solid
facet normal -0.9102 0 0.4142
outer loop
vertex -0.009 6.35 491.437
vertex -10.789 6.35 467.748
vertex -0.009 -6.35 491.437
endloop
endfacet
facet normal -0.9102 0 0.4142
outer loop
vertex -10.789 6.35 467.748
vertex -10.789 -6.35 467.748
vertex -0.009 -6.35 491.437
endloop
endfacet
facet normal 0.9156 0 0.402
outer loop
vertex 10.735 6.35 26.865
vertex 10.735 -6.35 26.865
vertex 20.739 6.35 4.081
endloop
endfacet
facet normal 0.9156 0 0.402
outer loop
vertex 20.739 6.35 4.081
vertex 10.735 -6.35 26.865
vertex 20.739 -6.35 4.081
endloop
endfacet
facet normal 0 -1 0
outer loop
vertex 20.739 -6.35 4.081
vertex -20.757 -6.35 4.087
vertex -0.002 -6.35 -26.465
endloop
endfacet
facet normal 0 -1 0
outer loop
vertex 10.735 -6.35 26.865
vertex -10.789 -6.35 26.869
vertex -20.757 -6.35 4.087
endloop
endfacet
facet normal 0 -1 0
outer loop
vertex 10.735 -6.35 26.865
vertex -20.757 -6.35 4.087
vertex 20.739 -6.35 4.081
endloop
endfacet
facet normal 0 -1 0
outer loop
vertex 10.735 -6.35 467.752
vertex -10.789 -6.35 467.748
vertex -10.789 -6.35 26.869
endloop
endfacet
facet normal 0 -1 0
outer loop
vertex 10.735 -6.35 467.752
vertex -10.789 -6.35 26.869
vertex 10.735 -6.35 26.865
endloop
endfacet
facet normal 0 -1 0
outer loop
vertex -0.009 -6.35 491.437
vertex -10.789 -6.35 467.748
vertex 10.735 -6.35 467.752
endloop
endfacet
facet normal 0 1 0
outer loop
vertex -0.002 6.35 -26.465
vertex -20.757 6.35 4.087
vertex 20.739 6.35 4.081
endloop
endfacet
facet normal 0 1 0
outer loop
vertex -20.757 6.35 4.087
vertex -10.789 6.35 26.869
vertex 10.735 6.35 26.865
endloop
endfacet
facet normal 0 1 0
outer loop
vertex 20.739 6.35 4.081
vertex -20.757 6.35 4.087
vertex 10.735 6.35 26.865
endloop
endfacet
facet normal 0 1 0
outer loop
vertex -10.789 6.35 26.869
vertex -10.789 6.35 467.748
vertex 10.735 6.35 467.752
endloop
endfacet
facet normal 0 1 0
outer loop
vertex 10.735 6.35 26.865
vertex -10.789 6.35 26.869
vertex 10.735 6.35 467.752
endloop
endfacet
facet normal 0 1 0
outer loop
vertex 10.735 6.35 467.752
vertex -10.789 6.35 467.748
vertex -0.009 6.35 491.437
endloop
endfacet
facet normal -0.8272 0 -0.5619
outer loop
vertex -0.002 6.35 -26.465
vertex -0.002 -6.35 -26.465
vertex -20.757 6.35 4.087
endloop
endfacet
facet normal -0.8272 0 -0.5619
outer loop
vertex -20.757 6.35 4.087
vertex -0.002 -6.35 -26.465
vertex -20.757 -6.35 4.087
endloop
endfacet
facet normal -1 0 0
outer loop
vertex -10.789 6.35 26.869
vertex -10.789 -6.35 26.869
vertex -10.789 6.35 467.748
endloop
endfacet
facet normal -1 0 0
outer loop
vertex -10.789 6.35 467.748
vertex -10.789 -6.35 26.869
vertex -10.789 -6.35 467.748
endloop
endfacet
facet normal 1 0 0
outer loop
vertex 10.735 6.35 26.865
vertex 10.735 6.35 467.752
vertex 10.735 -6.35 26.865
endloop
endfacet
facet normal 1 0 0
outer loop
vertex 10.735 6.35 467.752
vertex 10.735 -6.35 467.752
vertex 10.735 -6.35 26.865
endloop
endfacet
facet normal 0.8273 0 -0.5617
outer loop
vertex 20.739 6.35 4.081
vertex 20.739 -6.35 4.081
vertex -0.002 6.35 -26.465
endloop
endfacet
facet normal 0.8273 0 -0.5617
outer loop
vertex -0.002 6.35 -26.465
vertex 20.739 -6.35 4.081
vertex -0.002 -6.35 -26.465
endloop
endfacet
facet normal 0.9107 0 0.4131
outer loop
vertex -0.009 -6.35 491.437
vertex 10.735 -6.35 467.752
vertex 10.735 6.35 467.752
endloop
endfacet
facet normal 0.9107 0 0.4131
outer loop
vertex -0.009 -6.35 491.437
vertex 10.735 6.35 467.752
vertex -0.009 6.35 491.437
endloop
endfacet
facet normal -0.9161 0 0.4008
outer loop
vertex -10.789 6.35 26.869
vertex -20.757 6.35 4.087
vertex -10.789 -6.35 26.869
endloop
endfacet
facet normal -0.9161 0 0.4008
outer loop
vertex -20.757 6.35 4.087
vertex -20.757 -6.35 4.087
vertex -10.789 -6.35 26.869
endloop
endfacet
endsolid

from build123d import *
from build123d import SkipClean  # not in build123d's __all__

# Parameters (mm, degrees)
F1_DEPTH = 6.35
F2_DEPTH = 6.35
F3_SIZE2 = 6.34999
F3_SIZE  = 6.34999
F4_DEPTH = 0.0254
F5_DEPTH = 0.0254
F7_DEPTH = 25.4
F8_DEPTH = 0.0254
F9_DEPTH = 0.0254


# Not quite as in the source:
# - a fillet or chamfer is up to 0.001 mm smaller than in the source, because OpenCascade refuses the exact size
# - ends of sketch curves that miss each other by under 0.0002 mm in the source are joined


with BuildPart() as f1:
    # F0 (on Front) → F1 (new body)
    with BuildSketch(Plane.XZ):
        Polygon((-17.139416188, 28.1973872334), (-27.9807504267, 3.4191238228), (0, -37.7674587071), (27.964355424, 3.4191238228), (17.08493568, 28.1973872334), (17.08493568, 469.1244959831), (0, 506.7884922028), (-17.139416188, 469.1244959831), align=None)
    extrude(amount=F1_DEPTH)

    # F2 (add): a face of the model
    f2_faces = [f1.faces().sort_by_distance(p)[0] for p in [
        (-0.0248835797, 0, 225.9211420486),
    ]]
    extrude(f2_faces, amount=F2_DEPTH)

    # F3 (size 6.35 and 6.35 in the source; OpenCascade refuses exactly that, so slightly less here)
    f3_edges = [f1.edges().sort_by_distance(p)[0] for p in [
        (-22.560083, -6.35, 15.808256),
        (-13.990375, -6.35, -17.174167),
        (13.982178, -6.35, -17.174167),
        (22.524646, -6.35, 15.808256),
        (17.084936, -6.35, 248.660942),
        (8.542468, -6.35, 487.956494),
        (-8.569708, -6.35, 487.956494),
        (-17.139416, -6.35, 248.660942),
        (-22.560083, 6.35, 15.808256),
        (-13.990375, 6.35, -17.174167),
        (13.982178, 6.35, -17.174167),
        (22.524646, 6.35, 15.808256),
        (17.084936, 6.35, 248.660942),
        (8.542468, 6.35, 487.956494),
        (-8.569708, 6.35, 487.956494),
        (-17.139416, 6.35, 248.660942),
    ]]
    chamfer(f3_edges, length=F3_SIZE, length2=F3_SIZE2)

    # F4 (add): a face of the model
    f4_faces = [f1.faces().sort_by_distance(p)[0] for p in [
        (-0.0252861091, -6.35, 223.0026633937),
    ]]
    extrude(f4_faces, amount=F4_DEPTH)

    # F5 (add): a face of the model
    f5_faces = [f1.faces().sort_by_distance(p)[0] for p in [
        (-0.0252861091, 6.35, 223.0026633937),
    ]]
    extrude(f5_faces, amount=F5_DEPTH)

    # F6 (on face) → F7 (cut)
    with BuildSketch(Plane.XZ.offset(6.3754)):
        Polygon((10.73493568, 467.7515936734), (10.73493568, 99.0661755204), (32.7086560428, 99.0661755204), (32.7086560428, 505.495429039), (10.73493568, 505.495429039), (10.73493568, 501.6054906496), (19.4450523704, 491.0283088684), (13.1097852611, 474.0980863571), (20.738528953, 474.0980863571), (20.738528953, 467.7515928086), align=None)
        Polygon((32.7086560428, 99.0661755204), (10.73493568, 99.0661755204), (10.73493568, 29.554810375), (20.738528953, 31.6301956773), (21.6034320424, 29.554810375), (32.7086560428, 29.554810375), align=None)
        Polygon((20.738528953, 31.6301956773), (10.73493568, 29.554810375), (21.6034320424, 29.554810375), align=None)
        Polygon((21.6034320424, 29.554810375), (10.73493568, 29.554810375), (10.73493568, 26.8647358603), (20.738530435, 4.0811948515), (27.3526439581, -1.5923568075), (32.2193913162, 4.0811982268), align=None)
        Polygon((-0.0092029974, 491.4372314137), (10.73494568, 467.7515949707), (10.73493568, 474.0980863571), (10.73493568, 501.6054906496), (0, 514.6415233612), (-11.796230803, 486.6769015789), (-10.789416188, 486.6769015789), (-10.789416188, 467.7476089999), align=None)
        Polygon((13.1097852611, 474.0980863571), (10.73493568, 467.7515928086), (20.738528953, 467.7515928086), (20.738528953, 474.0980863571), align=None)
        Polygon((10.73493568, 474.0980863571), (10.73493568, 467.7515936734), (13.1097852611, 474.0980863571), align=None)
        Polygon((10.73493568, 501.6054906496), (10.73493568, 474.0980863571), (13.1097852611, 474.0980863571), (19.4450523704, 491.0283088684), align=None)
        Polygon((27.3526439581, -1.5923568075), (20.738528953, 4.0811982268), (24.6255261009, -4.7715753101), align=None)
        Polygon((24.6255261009, -4.7715753101), (20.738530435, 4.0811948515), (-0.0015394217, -26.4652965043), (0, -41.624262929), (29.7397422671, -3.639997893), (27.3526439581, -1.5923568075), align=None)
        Polygon((-16.2565966219, 476.1029779911), (-10.789416188, 467.7476075543), (-10.789416188, 486.6769015789), (-11.796230803, 486.6769015789), align=None)
        Polygon((-10.789416188, 26.8690092904), (-10.789416188, 467.7476089999), (-16.2565966219, 476.1029779911), (-11.796230803, 486.6769015789), (-21.7237770557, 486.6769015789), (-21.7237770557, 26.8690092904), (-20.8278130876, 26.8690092904), (-18.3457657695, 33.1129990518), align=None)
        Polygon((0, -41.624262929), (-0.0015394241, -26.4652787056), (-20.7574730934, 4.0866529625), (-30.316057774, 2.9998017031), align=None)
        Polygon((-20.8278130876, 26.8690092904), (-10.789416188, 26.8690092904), (-18.3457657695, 33.1129990518), align=None)
        Polygon((-20.7574730934, 4.0866529625), (-10.789416188, 26.8690092904), (-20.8278130876, 26.8690092904), (-30.316057774, 2.9998017031), align=None)
    with SkipClean():  # cleaning this boolean's faces spoils the solid; the shape is the same uncleaned
        extrude(amount=-F7_DEPTH, mode=Mode.SUBTRACT)

    # F8 (cut): a face of the model
    f8_faces = [f1.faces().sort_by_distance(p)[0] for p in [
        (-0.0252861091, -6.3754, 223.0026633937),
    ]]
    extrude(f8_faces, amount=-F8_DEPTH, mode=Mode.SUBTRACT)

    # F9 (cut): a face of the model
    f9_faces = [f1.faces().sort_by_distance(p)[0] for p in [
        (-0.0252864299, 6.3754, 223.0026587516),
    ]]
    extrude(f9_faces, amount=-F9_DEPTH, mode=Mode.SUBTRACT)


solid = f1.part
